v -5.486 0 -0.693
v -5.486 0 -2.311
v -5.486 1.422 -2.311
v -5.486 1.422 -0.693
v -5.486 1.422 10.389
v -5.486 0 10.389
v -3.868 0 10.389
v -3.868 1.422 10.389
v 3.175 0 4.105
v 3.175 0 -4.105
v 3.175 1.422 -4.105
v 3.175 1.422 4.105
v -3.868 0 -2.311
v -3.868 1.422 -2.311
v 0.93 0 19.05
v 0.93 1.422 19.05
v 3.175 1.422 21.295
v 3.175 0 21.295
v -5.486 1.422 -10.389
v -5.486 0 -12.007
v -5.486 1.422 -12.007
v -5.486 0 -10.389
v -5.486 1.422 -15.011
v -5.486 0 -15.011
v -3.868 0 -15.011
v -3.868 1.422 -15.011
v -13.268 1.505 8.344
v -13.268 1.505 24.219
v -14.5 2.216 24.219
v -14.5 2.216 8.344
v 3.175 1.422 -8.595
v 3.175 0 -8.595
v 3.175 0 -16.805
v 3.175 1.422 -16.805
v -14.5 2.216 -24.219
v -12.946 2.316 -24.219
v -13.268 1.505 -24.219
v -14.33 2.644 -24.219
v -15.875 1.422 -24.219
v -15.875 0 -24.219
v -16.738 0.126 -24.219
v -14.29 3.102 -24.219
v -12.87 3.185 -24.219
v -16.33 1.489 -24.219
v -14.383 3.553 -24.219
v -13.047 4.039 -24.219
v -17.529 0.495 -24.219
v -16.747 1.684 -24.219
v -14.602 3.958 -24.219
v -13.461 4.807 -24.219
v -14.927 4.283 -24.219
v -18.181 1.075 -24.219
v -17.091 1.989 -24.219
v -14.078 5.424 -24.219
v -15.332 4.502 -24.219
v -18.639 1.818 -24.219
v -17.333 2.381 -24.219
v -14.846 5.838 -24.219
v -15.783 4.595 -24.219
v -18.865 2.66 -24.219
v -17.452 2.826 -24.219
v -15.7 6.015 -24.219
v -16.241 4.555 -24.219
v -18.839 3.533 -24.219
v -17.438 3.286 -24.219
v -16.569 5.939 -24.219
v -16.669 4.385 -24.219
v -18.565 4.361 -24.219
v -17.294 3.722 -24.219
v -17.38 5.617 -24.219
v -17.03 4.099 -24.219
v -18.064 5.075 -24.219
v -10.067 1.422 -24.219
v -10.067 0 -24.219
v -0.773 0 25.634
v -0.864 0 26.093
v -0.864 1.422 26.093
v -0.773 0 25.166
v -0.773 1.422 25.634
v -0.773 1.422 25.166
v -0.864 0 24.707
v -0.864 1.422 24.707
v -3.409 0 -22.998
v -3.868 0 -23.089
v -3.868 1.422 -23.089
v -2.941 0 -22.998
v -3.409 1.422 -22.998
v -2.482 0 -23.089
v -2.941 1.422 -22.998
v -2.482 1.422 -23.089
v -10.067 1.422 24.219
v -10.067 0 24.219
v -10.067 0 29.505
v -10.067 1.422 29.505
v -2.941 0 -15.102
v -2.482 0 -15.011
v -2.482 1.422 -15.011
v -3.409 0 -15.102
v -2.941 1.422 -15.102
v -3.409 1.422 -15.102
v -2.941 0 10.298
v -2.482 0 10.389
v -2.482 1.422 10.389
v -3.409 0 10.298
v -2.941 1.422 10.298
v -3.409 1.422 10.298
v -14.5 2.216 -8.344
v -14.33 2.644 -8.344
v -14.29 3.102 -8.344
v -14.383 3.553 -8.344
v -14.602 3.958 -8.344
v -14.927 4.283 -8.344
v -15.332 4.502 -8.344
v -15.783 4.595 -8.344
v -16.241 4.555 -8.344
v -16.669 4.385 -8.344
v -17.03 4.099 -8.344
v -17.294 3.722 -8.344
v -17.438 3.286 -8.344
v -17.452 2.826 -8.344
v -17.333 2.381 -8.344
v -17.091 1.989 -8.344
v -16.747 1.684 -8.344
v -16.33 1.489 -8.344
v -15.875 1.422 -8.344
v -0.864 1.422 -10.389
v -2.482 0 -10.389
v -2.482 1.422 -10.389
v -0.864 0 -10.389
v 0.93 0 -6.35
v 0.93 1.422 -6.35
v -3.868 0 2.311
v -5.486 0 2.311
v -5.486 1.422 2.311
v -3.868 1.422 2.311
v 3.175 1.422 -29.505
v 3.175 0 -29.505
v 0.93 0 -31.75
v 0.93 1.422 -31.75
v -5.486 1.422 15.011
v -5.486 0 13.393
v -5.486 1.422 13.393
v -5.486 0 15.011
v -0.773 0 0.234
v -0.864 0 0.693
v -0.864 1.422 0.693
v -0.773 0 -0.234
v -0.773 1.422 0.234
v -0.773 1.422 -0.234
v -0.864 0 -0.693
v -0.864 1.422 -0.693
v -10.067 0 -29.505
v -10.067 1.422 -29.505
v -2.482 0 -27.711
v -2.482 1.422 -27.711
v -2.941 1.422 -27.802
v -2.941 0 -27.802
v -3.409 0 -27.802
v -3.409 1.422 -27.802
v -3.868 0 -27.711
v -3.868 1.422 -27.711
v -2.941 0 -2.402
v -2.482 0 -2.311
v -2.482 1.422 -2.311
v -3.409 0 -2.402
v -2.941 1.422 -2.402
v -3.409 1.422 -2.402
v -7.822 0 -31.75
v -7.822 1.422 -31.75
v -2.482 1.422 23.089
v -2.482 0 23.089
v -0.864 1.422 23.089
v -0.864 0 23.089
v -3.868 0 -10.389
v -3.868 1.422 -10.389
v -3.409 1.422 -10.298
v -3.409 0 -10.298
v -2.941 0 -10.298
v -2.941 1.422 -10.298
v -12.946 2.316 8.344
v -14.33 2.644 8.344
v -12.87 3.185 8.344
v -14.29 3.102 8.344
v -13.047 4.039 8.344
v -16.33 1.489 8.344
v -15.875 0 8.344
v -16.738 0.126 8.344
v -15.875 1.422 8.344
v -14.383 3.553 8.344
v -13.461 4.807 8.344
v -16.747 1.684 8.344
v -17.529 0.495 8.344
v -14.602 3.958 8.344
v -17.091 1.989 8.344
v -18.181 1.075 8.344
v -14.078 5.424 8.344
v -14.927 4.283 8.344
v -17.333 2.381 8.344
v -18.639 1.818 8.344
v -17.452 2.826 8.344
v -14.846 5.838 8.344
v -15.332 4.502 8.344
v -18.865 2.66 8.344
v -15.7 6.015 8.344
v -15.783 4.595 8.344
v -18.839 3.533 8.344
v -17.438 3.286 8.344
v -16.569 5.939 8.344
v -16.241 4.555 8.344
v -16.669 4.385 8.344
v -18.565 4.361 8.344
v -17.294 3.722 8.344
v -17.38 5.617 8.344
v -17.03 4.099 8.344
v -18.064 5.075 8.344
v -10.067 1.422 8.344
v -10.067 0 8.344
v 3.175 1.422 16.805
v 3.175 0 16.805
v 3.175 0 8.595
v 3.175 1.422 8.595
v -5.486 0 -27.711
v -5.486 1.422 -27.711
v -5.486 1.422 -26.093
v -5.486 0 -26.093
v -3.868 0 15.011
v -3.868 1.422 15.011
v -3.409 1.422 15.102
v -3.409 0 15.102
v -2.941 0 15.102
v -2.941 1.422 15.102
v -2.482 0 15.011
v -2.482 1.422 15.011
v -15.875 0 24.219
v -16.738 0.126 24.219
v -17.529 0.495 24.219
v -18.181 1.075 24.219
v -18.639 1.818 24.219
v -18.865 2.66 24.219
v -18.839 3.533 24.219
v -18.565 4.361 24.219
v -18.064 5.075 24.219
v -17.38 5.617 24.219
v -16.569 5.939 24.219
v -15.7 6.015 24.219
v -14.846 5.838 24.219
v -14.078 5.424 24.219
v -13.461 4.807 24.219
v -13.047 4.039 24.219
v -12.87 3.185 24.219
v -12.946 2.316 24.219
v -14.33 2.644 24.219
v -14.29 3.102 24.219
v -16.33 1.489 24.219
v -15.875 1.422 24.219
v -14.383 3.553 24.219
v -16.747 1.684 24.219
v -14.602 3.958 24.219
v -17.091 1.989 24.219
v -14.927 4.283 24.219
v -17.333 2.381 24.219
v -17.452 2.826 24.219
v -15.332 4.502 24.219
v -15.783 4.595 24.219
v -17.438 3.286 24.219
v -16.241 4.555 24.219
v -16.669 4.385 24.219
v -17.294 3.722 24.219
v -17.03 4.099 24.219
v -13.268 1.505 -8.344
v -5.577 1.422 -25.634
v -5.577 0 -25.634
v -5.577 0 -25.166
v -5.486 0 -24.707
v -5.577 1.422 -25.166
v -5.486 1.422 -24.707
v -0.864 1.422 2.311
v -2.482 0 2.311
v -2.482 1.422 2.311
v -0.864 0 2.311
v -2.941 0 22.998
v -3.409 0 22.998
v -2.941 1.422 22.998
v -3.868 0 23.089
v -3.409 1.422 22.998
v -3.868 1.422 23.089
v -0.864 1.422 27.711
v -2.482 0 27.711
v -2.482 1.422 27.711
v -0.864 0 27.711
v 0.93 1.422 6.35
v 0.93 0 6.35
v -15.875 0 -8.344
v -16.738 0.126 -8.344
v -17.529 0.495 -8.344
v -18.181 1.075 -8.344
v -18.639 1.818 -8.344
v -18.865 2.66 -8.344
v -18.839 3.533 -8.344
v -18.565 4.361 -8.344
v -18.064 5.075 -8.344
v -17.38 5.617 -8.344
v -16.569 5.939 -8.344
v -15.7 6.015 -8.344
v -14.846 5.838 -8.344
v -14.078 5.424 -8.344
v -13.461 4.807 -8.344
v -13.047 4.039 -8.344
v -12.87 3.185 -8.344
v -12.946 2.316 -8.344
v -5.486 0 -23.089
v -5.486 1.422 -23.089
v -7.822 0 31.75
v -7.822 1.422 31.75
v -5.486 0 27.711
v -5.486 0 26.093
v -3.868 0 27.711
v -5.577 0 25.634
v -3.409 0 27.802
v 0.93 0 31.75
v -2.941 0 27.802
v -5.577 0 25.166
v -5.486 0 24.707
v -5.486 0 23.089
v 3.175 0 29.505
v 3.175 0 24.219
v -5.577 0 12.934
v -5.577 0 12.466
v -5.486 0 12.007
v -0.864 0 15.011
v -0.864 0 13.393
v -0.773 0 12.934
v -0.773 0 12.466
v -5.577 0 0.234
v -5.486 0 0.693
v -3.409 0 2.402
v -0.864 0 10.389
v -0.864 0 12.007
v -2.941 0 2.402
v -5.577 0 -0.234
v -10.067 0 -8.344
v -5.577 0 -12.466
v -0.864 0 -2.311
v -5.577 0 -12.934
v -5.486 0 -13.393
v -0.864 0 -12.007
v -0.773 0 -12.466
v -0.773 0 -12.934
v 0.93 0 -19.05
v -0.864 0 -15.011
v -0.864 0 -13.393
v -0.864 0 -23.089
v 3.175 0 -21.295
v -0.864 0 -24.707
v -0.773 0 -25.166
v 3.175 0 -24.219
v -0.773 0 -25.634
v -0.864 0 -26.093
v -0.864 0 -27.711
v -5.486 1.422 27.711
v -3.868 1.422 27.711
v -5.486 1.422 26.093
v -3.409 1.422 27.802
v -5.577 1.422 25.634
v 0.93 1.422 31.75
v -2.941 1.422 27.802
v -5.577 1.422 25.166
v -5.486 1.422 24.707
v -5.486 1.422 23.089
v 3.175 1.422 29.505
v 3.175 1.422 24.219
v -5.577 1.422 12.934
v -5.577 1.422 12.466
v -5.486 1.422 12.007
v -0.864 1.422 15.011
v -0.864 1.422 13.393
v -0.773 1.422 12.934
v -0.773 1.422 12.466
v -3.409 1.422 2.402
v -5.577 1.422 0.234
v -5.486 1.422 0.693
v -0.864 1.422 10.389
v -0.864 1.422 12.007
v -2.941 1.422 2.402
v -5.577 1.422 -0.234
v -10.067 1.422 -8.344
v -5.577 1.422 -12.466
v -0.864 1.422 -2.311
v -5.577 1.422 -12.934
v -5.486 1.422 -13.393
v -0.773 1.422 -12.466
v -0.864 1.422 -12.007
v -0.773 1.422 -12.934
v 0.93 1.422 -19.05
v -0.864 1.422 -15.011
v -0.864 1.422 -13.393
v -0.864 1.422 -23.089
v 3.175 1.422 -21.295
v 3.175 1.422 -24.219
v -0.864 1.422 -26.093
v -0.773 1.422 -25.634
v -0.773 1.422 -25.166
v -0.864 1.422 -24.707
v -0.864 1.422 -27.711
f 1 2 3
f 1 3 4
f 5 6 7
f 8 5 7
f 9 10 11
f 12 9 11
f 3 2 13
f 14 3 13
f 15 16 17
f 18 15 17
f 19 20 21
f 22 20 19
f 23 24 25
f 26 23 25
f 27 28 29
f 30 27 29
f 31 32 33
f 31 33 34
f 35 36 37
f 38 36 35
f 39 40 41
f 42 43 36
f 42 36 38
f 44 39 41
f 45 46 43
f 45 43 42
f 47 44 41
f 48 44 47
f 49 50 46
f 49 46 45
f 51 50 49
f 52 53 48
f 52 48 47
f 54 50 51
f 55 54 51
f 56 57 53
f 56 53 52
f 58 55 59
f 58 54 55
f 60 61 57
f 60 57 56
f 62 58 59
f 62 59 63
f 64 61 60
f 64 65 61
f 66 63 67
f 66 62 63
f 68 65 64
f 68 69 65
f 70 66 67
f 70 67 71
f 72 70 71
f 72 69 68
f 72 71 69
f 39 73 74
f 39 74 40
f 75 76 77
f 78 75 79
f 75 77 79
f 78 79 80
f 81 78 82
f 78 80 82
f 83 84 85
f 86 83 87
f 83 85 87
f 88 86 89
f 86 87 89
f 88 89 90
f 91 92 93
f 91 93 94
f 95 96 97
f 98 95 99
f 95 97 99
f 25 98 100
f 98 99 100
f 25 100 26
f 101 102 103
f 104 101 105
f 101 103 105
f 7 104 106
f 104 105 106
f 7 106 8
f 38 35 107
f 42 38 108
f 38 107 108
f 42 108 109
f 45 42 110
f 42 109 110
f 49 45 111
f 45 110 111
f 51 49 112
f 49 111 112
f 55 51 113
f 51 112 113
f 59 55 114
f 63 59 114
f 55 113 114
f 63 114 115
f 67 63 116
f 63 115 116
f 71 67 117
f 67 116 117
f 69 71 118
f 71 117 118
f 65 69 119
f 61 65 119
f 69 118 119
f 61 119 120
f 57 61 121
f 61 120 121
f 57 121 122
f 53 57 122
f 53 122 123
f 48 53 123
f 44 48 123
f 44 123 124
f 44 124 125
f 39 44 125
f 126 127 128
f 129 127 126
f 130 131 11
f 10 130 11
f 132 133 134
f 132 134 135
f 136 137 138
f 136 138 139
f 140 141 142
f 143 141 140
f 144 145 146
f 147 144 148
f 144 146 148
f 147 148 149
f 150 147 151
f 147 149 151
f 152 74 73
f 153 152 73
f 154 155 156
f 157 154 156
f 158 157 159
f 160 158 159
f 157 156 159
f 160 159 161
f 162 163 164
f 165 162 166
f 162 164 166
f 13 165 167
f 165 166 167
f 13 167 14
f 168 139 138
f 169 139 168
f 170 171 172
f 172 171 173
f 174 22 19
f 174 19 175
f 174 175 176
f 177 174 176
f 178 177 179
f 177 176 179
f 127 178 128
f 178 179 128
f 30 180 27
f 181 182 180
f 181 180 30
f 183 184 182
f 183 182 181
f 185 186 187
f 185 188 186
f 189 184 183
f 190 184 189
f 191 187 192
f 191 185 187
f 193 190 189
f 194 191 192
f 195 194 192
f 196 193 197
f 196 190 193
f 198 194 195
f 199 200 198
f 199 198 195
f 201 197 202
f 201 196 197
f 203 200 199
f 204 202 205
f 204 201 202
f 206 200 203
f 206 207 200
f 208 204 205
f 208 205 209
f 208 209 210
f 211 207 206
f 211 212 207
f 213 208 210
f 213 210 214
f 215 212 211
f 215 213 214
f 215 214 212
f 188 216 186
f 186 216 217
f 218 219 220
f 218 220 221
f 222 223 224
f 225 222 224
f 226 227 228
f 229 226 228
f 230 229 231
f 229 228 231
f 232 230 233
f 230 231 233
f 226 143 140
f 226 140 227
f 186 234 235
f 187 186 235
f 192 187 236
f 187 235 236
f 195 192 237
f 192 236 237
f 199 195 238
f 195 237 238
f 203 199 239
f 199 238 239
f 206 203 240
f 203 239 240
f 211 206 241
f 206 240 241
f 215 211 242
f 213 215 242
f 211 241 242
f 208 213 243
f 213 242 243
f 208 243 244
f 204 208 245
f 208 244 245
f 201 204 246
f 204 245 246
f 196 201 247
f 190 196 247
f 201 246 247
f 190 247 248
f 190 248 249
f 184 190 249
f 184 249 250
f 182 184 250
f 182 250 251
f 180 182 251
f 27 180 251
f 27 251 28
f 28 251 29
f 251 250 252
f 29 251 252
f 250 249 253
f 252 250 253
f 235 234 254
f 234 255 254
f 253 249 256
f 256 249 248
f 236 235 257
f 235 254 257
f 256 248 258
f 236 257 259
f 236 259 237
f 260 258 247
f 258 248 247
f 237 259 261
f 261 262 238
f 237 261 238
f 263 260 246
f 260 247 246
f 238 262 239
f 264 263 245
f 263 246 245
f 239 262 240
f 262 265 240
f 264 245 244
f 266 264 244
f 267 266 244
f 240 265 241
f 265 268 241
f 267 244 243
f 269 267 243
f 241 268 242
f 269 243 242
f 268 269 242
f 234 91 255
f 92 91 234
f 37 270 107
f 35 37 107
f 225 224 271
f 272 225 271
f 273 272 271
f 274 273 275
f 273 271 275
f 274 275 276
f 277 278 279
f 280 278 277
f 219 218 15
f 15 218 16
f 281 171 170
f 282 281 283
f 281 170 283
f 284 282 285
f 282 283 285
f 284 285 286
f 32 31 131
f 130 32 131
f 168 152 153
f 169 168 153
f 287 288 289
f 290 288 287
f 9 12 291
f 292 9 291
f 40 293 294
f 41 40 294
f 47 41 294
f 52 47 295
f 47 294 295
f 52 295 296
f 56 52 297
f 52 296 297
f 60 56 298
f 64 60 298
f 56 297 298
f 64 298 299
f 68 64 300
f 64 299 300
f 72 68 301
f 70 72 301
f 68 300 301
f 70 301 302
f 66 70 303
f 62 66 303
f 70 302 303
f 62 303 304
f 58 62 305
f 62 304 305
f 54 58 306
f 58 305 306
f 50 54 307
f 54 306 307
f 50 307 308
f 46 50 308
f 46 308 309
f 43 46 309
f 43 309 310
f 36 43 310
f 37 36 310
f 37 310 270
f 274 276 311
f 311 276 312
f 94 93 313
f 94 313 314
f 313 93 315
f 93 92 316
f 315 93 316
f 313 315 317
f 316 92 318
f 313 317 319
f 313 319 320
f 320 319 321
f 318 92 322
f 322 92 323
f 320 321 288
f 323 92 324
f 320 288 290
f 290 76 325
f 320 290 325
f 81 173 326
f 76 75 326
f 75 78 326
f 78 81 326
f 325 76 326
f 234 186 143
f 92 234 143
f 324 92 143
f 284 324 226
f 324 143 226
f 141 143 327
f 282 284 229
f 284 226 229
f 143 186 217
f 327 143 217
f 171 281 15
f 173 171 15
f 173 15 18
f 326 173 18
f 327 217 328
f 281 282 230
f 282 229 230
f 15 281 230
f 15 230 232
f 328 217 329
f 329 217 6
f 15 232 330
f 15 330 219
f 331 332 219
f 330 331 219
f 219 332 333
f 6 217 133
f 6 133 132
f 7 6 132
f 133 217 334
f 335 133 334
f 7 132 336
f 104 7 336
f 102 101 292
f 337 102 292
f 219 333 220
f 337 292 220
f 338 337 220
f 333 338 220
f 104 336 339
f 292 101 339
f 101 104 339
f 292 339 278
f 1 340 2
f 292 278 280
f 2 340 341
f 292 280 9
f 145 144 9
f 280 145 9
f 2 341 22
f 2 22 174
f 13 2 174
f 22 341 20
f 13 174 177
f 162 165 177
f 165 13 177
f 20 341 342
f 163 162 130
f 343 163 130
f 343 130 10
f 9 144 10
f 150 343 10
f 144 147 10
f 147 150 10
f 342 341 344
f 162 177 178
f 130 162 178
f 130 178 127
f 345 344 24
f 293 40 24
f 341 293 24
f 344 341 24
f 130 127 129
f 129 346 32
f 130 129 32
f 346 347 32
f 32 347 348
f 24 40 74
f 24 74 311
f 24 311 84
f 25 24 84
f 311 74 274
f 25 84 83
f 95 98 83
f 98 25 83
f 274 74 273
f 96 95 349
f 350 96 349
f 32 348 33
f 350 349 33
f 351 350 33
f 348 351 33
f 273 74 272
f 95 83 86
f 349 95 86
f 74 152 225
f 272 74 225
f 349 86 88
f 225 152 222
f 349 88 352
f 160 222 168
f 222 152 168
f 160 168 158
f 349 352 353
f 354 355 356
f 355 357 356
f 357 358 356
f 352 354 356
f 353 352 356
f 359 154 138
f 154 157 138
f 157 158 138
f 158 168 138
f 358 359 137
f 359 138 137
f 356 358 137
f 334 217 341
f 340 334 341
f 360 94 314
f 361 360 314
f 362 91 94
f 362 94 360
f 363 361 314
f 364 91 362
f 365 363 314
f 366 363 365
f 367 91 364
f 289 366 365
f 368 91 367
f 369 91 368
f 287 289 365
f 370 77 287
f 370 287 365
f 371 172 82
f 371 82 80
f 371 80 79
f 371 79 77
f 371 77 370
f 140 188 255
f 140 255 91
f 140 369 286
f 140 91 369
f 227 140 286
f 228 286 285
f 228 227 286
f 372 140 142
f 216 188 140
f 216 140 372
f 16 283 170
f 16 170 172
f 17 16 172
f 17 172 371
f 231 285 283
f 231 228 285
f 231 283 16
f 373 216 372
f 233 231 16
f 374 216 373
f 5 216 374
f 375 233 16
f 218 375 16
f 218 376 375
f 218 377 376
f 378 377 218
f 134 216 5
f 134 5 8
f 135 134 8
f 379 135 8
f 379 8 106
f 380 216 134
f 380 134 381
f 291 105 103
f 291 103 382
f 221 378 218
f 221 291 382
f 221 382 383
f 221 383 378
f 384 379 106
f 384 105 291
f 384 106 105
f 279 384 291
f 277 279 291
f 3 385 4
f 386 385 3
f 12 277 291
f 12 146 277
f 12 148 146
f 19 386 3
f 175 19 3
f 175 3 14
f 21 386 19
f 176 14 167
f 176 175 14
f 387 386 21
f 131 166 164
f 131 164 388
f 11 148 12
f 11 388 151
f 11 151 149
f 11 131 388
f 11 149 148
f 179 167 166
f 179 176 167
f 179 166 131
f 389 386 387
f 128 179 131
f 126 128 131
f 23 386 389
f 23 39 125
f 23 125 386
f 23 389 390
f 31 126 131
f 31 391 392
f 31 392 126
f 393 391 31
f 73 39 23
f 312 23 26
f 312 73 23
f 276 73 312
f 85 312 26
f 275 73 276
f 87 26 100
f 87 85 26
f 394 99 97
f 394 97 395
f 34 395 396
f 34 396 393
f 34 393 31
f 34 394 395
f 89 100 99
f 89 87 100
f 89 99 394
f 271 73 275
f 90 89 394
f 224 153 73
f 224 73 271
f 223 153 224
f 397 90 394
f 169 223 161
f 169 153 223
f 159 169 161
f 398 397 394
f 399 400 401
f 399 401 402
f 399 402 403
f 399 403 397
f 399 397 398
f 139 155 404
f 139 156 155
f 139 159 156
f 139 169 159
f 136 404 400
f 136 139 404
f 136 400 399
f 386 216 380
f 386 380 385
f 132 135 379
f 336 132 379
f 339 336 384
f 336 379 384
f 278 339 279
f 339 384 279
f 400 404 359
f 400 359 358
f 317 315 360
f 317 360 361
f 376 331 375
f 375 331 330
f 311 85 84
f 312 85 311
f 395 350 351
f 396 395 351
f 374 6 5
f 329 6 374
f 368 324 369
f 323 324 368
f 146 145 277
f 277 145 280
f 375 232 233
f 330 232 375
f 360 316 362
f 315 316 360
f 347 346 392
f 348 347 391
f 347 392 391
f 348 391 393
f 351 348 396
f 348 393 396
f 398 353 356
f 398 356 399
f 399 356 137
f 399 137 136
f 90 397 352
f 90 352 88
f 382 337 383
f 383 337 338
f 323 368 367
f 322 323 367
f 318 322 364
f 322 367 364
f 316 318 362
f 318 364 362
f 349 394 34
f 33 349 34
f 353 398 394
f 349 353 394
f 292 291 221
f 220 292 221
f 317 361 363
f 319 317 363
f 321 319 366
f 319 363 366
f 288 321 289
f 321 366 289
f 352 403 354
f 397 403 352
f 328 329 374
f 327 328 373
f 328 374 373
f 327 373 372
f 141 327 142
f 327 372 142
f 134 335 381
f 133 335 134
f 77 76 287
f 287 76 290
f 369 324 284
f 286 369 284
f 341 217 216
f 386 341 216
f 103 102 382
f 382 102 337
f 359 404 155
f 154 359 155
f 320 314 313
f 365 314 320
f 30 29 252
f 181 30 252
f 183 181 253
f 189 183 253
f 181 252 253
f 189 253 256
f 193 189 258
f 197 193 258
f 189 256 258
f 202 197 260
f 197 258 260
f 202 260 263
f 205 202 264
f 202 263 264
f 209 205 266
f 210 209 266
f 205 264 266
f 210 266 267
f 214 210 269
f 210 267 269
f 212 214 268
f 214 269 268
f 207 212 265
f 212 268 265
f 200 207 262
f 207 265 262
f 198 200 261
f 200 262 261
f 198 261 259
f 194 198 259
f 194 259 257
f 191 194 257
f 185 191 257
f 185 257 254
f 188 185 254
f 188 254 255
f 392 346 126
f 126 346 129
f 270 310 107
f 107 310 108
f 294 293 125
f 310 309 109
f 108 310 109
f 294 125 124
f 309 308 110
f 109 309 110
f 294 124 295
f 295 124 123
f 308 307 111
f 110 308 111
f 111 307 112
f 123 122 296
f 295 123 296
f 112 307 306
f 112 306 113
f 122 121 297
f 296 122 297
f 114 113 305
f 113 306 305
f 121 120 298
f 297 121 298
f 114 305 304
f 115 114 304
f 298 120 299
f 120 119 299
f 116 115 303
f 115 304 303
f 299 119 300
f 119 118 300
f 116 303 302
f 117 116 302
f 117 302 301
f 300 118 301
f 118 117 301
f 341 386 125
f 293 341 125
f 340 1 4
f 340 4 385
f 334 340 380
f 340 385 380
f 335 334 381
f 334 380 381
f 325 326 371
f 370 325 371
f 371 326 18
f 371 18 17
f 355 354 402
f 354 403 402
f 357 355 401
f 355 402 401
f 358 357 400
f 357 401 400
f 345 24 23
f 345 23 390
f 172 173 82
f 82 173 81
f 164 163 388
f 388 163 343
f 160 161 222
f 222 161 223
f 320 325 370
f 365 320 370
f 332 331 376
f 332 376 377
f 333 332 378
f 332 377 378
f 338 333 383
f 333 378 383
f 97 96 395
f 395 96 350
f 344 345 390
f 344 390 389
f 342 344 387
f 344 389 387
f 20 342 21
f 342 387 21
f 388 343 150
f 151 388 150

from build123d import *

# Parameters (mm, degrees)
BOSS_EXTRUDE1_DEPTH       = 15.875
BOSS_EXTRUDE1_START       = -16.6878
BOSS_EXTRUDE1_2_OUTLINE_W = 13.242442679
BOSS_EXTRUDE1_2_OUTLINE_H = 1.4224
BOSS_EXTRUDE1_2_DEPTH     = 16.6878
BOSS_EXTRUDE2_START       = 15.875
BOSS_EXTRUDE2_DEPTH       = 15.875
SKETCH3_W                 = 13.242442679
SKETCH3_H                 = 1.4224
BOSS_EXTRUDE3_DEPTH       = 7.5311
SKETCH4_W                 = 13.242442679
SKETCH4_H                 = 1.4224
BOSS_EXTRUDE4_DEPTH       = 7.5311
CUT_EXTRUDE1_DEPTH        = 38.226845626
CUT_EXTRUDE2_DEPTH        = 38.226845626
CUT_EXTRUDE3_DEPTH        = 38.226845626
CUT_EXTRUDE4_DEPTH        = 38.226845626
SKETCH9_W                 = 4.6228
SKETCH9_H                 = 4.6228
CUT_EXTRUDE5_DEPTH        = 38.429132244
SKETCH10_W                = 4.6228
SKETCH10_H                = 4.6228
CUT_EXTRUDE6_DEPTH        = 38.429132244
SKETCH11_W                = 4.6228
SKETCH11_H                = 4.6228
CUT_EXTRUDE7_DEPTH        = 38.429132244
SKETCH12_W                = 4.6228
SKETCH12_H                = 4.6228
CUT_EXTRUDE8_DEPTH        = 38.429132244
SKETCH13_W                = 4.6228
SKETCH13_H                = 4.6228
CUT_EXTRUDE9_DEPTH        = 38.226845626
DRAFT1_ANGLE              = 45
DRAFT2_ANGLE              = 45
CHAMFER1_SIZE             = 2.24506403
SKETCH14_R                = 2.413
CUT_EXTRUDE10_DEPTH       = 2.54
LPATTERN1_COUNT           = 5
LPATTERN1_PITCH           = 12.7


with BuildPart() as part:
    # Boss-Extrude1: read off the stored shape, not the designer's step
    # Boss-Extrude1 outline → Boss-Extrude1 (new body)
    with BuildSketch(Plane(origin=(0, 0, -8.3439), x_dir=(-1, 0, 0), z_dir=(0, 0, -1))):
        with BuildLine():
            ThreePointArc((15.875, 0), (17.379950004, 5.616549878), (13.26835013, 1.504950004))
            Line((13.26835013, 1.504950004), (14.500184664, 2.216150004))
            ThreePointArc((14.500184664, 2.216150004), (16.668750004, 4.384715344), (15.875, 1.4224))
            Line((15.875, 1.4224), (-3.175, 1.4224))
            Line((-3.175, 1.4224), (-3.175, 0))
            Line((-3.175, 0), (15.875, 0))
        make_face()
    extrude(amount=BOSS_EXTRUDE1_DEPTH)

    # Boss-Extrude1 2 outline → Boss-Extrude1 2 (add)
    with BuildSketch(Plane(origin=(0, 0, -8.3439), x_dir=(-1, 0, 0), z_dir=(0, 0, -1)).offset(BOSS_EXTRUDE1_START)):
        with Locations((3.44622134, 0.7112)):
            Rectangle(BOSS_EXTRUDE1_2_OUTLINE_W, BOSS_EXTRUDE1_2_OUTLINE_H)
    extrude(amount=BOSS_EXTRUDE1_2_DEPTH)

    # Sketch2 → Boss-Extrude2 (add)
    with BuildSketch(Plane.XY.offset(8.3439).offset(BOSS_EXTRUDE2_START)):
        with BuildLine():
            Line((3.175, -6e-09), (-15.875, -6e-09))
            ThreePointArc((-15.875, -6e-09), (-17.379950004, 5.616549873), (-13.26835013, 1.504949999))
            Line((-13.26835013, 1.504949999), (-14.500184664, 2.216149999))
            ThreePointArc((-14.500184664, 2.216149999), (-16.668750004, 4.384715339), (-15.875, 1.422399994))
            Line((-15.875, 1.422399994), (3.175, 1.422399994))
            Line((3.175, 1.422399994), (3.175, -6e-09))
        make_face()
    extrude(amount=-BOSS_EXTRUDE2_DEPTH)

    # Sketch3 → Boss-Extrude3 (add)
    with BuildSketch(Plane(origin=(0, 0, -24.2189), x_dir=(-1, 0, 0), z_dir=(0, 0, -1))):
        with Locations((3.44622134, 0.7112)):
            Rectangle(SKETCH3_W, SKETCH3_H)
    extrude(amount=BOSS_EXTRUDE3_DEPTH)

    # Sketch4 → Boss-Extrude4 (add)
    with BuildSketch(Plane.XY.offset(24.2189)):
        with Locations((-3.44622134, 0.7112)):
            Rectangle(SKETCH4_W, SKETCH4_H)
    extrude(amount=BOSS_EXTRUDE4_DEPTH)

    # Sketch5 → Cut-Extrude1 (cut, through all)
    with BuildSketch(Plane(origin=(0, 1.4224, 0), x_dir=(-1, 0, 0), z_dir=(0, 1, 0))):
        Polygon((-3.175, -16.80493597), (-3.175, -21.29506403), (1.315128061, -16.80493597), align=None)
    extrude(amount=-CUT_EXTRUDE1_DEPTH, mode=Mode.SUBTRACT)

    # Sketch6 → Cut-Extrude2 (cut, through all)
    with BuildSketch(Plane(origin=(0, 1.4224, 0), x_dir=(-1, 0, 0), z_dir=(0, 1, 0))):
        Polygon((-3.175, -4.10493597), (-3.175, -8.59506403), (1.315128061, -8.59506403), align=None)
    extrude(amount=-CUT_EXTRUDE2_DEPTH, mode=Mode.SUBTRACT)

    # Sketch7 → Cut-Extrude3 (cut, through all)
    with BuildSketch(Plane(origin=(0, 1.4224, 0), x_dir=(-1, 0, 0), z_dir=(0, 1, 0))):
        Polygon((-3.175, 8.59506403), (-3.175, 4.10493597), (1.315128061, 8.59506403), align=None)
    extrude(amount=-CUT_EXTRUDE3_DEPTH, mode=Mode.SUBTRACT)

    # Sketch8 → Cut-Extrude4 (cut, through all)
    with BuildSketch(Plane(origin=(0, 1.4224, 0), x_dir=(-1, 0, 0), z_dir=(0, 1, 0))):
        Polygon((-3.175, 21.29506403), (-3.175, 16.80493597), (1.315128061, 16.80493597), align=None)
    extrude(amount=-CUT_EXTRUDE4_DEPTH, mode=Mode.SUBTRACT)

    # Sketch9 → Cut-Extrude5 (cut, through all)
    with BuildSketch(Plane.XZ):
        with Locations((-3.175, 25.4)):
            Rectangle(SKETCH9_W, SKETCH9_H)
    extrude(amount=-CUT_EXTRUDE5_DEPTH, mode=Mode.SUBTRACT)

    # Sketch10 → Cut-Extrude6 (cut, through all)
    with BuildSketch(Plane.XZ):
        with Locations((-3.175, 12.7)):
            Rectangle(SKETCH10_W, SKETCH10_H)
    extrude(amount=-CUT_EXTRUDE6_DEPTH, mode=Mode.SUBTRACT)

    # Sketch11 → Cut-Extrude7 (cut, through all)
    with BuildSketch(Plane.XZ):
        with Locations((-3.175, 0)):
            Rectangle(SKETCH11_W, SKETCH11_H)
    extrude(amount=-CUT_EXTRUDE7_DEPTH, mode=Mode.SUBTRACT)

    # Sketch12 → Cut-Extrude8 (cut, through all)
    with BuildSketch(Plane.XZ):
        with Locations((-3.175, -12.7)):
            Rectangle(SKETCH12_W, SKETCH12_H)
    extrude(amount=-CUT_EXTRUDE8_DEPTH, mode=Mode.SUBTRACT)

    # Sketch13 → Cut-Extrude9 (cut, through all)
    with BuildSketch(Plane(origin=(0, 1.4224, 0), x_dir=(-1, 0, 0), z_dir=(0, 1, 0))):
        with Locations((3.175, -25.4)):
            Rectangle(SKETCH13_W, SKETCH13_H)
    extrude(amount=-CUT_EXTRUDE9_DEPTH, mode=Mode.SUBTRACT)

    # Draft1
    draft1_faces = [part.faces().sort_by_distance(p)[0] for p in [
        (0.92993597, 0.7112, -8.59506403),
        (0.92993597, 0.711199999, -16.80493597),
    ]]
    draft(draft1_faces, Plane(origin=(3.175, 0, 31.75), x_dir=(0, 0, 1), z_dir=(1, 0, 0)), DRAFT1_ANGLE)

    # Draft2
    draft2_faces = [part.faces().sort_by_distance(p)[0] for p in [
        (0.92993597, 0.7112, 16.80493597),
        (0.92993597, 0.711199997, 8.59506403),
    ]]
    draft(draft2_faces, Plane(origin=(3.175, 0, 31.75), x_dir=(0, 0, 1), z_dir=(1, 0, 0)), DRAFT2_ANGLE)

    # Chamfer1
    chamfer1_edges = [part.edges().sort_by_distance(p)[0] for p in [
        (3.175, 0.7112, 31.75),
        (-10.067442679, 0.7112, 31.75),
        (3.175, 0.7112, -31.75),
        (-10.067442679, 0.7112, -31.75),
    ]]
    chamfer(chamfer1_edges, length=CHAMFER1_SIZE)

    # Sketch14 → Cut-Extrude10 (cut)
    with BuildSketch(Plane(origin=(0, 1.4224, 0), x_dir=(1, 0, 0), z_dir=(0, 1, 0))):
        with Locations((-3.175, -25.4)):
            Circle(SKETCH14_R)
    cut_extrude10 = extrude(amount=-CUT_EXTRUDE10_DEPTH, mode=Mode.SUBTRACT)

    # LPattern1: Cut-Extrude10 ×5
    with Locations(*[(0, 0, -i * LPATTERN1_PITCH) for i in range(1, LPATTERN1_COUNT)]):
        add(cut_extrude10, mode=Mode.SUBTRACT)


solid = part.part
